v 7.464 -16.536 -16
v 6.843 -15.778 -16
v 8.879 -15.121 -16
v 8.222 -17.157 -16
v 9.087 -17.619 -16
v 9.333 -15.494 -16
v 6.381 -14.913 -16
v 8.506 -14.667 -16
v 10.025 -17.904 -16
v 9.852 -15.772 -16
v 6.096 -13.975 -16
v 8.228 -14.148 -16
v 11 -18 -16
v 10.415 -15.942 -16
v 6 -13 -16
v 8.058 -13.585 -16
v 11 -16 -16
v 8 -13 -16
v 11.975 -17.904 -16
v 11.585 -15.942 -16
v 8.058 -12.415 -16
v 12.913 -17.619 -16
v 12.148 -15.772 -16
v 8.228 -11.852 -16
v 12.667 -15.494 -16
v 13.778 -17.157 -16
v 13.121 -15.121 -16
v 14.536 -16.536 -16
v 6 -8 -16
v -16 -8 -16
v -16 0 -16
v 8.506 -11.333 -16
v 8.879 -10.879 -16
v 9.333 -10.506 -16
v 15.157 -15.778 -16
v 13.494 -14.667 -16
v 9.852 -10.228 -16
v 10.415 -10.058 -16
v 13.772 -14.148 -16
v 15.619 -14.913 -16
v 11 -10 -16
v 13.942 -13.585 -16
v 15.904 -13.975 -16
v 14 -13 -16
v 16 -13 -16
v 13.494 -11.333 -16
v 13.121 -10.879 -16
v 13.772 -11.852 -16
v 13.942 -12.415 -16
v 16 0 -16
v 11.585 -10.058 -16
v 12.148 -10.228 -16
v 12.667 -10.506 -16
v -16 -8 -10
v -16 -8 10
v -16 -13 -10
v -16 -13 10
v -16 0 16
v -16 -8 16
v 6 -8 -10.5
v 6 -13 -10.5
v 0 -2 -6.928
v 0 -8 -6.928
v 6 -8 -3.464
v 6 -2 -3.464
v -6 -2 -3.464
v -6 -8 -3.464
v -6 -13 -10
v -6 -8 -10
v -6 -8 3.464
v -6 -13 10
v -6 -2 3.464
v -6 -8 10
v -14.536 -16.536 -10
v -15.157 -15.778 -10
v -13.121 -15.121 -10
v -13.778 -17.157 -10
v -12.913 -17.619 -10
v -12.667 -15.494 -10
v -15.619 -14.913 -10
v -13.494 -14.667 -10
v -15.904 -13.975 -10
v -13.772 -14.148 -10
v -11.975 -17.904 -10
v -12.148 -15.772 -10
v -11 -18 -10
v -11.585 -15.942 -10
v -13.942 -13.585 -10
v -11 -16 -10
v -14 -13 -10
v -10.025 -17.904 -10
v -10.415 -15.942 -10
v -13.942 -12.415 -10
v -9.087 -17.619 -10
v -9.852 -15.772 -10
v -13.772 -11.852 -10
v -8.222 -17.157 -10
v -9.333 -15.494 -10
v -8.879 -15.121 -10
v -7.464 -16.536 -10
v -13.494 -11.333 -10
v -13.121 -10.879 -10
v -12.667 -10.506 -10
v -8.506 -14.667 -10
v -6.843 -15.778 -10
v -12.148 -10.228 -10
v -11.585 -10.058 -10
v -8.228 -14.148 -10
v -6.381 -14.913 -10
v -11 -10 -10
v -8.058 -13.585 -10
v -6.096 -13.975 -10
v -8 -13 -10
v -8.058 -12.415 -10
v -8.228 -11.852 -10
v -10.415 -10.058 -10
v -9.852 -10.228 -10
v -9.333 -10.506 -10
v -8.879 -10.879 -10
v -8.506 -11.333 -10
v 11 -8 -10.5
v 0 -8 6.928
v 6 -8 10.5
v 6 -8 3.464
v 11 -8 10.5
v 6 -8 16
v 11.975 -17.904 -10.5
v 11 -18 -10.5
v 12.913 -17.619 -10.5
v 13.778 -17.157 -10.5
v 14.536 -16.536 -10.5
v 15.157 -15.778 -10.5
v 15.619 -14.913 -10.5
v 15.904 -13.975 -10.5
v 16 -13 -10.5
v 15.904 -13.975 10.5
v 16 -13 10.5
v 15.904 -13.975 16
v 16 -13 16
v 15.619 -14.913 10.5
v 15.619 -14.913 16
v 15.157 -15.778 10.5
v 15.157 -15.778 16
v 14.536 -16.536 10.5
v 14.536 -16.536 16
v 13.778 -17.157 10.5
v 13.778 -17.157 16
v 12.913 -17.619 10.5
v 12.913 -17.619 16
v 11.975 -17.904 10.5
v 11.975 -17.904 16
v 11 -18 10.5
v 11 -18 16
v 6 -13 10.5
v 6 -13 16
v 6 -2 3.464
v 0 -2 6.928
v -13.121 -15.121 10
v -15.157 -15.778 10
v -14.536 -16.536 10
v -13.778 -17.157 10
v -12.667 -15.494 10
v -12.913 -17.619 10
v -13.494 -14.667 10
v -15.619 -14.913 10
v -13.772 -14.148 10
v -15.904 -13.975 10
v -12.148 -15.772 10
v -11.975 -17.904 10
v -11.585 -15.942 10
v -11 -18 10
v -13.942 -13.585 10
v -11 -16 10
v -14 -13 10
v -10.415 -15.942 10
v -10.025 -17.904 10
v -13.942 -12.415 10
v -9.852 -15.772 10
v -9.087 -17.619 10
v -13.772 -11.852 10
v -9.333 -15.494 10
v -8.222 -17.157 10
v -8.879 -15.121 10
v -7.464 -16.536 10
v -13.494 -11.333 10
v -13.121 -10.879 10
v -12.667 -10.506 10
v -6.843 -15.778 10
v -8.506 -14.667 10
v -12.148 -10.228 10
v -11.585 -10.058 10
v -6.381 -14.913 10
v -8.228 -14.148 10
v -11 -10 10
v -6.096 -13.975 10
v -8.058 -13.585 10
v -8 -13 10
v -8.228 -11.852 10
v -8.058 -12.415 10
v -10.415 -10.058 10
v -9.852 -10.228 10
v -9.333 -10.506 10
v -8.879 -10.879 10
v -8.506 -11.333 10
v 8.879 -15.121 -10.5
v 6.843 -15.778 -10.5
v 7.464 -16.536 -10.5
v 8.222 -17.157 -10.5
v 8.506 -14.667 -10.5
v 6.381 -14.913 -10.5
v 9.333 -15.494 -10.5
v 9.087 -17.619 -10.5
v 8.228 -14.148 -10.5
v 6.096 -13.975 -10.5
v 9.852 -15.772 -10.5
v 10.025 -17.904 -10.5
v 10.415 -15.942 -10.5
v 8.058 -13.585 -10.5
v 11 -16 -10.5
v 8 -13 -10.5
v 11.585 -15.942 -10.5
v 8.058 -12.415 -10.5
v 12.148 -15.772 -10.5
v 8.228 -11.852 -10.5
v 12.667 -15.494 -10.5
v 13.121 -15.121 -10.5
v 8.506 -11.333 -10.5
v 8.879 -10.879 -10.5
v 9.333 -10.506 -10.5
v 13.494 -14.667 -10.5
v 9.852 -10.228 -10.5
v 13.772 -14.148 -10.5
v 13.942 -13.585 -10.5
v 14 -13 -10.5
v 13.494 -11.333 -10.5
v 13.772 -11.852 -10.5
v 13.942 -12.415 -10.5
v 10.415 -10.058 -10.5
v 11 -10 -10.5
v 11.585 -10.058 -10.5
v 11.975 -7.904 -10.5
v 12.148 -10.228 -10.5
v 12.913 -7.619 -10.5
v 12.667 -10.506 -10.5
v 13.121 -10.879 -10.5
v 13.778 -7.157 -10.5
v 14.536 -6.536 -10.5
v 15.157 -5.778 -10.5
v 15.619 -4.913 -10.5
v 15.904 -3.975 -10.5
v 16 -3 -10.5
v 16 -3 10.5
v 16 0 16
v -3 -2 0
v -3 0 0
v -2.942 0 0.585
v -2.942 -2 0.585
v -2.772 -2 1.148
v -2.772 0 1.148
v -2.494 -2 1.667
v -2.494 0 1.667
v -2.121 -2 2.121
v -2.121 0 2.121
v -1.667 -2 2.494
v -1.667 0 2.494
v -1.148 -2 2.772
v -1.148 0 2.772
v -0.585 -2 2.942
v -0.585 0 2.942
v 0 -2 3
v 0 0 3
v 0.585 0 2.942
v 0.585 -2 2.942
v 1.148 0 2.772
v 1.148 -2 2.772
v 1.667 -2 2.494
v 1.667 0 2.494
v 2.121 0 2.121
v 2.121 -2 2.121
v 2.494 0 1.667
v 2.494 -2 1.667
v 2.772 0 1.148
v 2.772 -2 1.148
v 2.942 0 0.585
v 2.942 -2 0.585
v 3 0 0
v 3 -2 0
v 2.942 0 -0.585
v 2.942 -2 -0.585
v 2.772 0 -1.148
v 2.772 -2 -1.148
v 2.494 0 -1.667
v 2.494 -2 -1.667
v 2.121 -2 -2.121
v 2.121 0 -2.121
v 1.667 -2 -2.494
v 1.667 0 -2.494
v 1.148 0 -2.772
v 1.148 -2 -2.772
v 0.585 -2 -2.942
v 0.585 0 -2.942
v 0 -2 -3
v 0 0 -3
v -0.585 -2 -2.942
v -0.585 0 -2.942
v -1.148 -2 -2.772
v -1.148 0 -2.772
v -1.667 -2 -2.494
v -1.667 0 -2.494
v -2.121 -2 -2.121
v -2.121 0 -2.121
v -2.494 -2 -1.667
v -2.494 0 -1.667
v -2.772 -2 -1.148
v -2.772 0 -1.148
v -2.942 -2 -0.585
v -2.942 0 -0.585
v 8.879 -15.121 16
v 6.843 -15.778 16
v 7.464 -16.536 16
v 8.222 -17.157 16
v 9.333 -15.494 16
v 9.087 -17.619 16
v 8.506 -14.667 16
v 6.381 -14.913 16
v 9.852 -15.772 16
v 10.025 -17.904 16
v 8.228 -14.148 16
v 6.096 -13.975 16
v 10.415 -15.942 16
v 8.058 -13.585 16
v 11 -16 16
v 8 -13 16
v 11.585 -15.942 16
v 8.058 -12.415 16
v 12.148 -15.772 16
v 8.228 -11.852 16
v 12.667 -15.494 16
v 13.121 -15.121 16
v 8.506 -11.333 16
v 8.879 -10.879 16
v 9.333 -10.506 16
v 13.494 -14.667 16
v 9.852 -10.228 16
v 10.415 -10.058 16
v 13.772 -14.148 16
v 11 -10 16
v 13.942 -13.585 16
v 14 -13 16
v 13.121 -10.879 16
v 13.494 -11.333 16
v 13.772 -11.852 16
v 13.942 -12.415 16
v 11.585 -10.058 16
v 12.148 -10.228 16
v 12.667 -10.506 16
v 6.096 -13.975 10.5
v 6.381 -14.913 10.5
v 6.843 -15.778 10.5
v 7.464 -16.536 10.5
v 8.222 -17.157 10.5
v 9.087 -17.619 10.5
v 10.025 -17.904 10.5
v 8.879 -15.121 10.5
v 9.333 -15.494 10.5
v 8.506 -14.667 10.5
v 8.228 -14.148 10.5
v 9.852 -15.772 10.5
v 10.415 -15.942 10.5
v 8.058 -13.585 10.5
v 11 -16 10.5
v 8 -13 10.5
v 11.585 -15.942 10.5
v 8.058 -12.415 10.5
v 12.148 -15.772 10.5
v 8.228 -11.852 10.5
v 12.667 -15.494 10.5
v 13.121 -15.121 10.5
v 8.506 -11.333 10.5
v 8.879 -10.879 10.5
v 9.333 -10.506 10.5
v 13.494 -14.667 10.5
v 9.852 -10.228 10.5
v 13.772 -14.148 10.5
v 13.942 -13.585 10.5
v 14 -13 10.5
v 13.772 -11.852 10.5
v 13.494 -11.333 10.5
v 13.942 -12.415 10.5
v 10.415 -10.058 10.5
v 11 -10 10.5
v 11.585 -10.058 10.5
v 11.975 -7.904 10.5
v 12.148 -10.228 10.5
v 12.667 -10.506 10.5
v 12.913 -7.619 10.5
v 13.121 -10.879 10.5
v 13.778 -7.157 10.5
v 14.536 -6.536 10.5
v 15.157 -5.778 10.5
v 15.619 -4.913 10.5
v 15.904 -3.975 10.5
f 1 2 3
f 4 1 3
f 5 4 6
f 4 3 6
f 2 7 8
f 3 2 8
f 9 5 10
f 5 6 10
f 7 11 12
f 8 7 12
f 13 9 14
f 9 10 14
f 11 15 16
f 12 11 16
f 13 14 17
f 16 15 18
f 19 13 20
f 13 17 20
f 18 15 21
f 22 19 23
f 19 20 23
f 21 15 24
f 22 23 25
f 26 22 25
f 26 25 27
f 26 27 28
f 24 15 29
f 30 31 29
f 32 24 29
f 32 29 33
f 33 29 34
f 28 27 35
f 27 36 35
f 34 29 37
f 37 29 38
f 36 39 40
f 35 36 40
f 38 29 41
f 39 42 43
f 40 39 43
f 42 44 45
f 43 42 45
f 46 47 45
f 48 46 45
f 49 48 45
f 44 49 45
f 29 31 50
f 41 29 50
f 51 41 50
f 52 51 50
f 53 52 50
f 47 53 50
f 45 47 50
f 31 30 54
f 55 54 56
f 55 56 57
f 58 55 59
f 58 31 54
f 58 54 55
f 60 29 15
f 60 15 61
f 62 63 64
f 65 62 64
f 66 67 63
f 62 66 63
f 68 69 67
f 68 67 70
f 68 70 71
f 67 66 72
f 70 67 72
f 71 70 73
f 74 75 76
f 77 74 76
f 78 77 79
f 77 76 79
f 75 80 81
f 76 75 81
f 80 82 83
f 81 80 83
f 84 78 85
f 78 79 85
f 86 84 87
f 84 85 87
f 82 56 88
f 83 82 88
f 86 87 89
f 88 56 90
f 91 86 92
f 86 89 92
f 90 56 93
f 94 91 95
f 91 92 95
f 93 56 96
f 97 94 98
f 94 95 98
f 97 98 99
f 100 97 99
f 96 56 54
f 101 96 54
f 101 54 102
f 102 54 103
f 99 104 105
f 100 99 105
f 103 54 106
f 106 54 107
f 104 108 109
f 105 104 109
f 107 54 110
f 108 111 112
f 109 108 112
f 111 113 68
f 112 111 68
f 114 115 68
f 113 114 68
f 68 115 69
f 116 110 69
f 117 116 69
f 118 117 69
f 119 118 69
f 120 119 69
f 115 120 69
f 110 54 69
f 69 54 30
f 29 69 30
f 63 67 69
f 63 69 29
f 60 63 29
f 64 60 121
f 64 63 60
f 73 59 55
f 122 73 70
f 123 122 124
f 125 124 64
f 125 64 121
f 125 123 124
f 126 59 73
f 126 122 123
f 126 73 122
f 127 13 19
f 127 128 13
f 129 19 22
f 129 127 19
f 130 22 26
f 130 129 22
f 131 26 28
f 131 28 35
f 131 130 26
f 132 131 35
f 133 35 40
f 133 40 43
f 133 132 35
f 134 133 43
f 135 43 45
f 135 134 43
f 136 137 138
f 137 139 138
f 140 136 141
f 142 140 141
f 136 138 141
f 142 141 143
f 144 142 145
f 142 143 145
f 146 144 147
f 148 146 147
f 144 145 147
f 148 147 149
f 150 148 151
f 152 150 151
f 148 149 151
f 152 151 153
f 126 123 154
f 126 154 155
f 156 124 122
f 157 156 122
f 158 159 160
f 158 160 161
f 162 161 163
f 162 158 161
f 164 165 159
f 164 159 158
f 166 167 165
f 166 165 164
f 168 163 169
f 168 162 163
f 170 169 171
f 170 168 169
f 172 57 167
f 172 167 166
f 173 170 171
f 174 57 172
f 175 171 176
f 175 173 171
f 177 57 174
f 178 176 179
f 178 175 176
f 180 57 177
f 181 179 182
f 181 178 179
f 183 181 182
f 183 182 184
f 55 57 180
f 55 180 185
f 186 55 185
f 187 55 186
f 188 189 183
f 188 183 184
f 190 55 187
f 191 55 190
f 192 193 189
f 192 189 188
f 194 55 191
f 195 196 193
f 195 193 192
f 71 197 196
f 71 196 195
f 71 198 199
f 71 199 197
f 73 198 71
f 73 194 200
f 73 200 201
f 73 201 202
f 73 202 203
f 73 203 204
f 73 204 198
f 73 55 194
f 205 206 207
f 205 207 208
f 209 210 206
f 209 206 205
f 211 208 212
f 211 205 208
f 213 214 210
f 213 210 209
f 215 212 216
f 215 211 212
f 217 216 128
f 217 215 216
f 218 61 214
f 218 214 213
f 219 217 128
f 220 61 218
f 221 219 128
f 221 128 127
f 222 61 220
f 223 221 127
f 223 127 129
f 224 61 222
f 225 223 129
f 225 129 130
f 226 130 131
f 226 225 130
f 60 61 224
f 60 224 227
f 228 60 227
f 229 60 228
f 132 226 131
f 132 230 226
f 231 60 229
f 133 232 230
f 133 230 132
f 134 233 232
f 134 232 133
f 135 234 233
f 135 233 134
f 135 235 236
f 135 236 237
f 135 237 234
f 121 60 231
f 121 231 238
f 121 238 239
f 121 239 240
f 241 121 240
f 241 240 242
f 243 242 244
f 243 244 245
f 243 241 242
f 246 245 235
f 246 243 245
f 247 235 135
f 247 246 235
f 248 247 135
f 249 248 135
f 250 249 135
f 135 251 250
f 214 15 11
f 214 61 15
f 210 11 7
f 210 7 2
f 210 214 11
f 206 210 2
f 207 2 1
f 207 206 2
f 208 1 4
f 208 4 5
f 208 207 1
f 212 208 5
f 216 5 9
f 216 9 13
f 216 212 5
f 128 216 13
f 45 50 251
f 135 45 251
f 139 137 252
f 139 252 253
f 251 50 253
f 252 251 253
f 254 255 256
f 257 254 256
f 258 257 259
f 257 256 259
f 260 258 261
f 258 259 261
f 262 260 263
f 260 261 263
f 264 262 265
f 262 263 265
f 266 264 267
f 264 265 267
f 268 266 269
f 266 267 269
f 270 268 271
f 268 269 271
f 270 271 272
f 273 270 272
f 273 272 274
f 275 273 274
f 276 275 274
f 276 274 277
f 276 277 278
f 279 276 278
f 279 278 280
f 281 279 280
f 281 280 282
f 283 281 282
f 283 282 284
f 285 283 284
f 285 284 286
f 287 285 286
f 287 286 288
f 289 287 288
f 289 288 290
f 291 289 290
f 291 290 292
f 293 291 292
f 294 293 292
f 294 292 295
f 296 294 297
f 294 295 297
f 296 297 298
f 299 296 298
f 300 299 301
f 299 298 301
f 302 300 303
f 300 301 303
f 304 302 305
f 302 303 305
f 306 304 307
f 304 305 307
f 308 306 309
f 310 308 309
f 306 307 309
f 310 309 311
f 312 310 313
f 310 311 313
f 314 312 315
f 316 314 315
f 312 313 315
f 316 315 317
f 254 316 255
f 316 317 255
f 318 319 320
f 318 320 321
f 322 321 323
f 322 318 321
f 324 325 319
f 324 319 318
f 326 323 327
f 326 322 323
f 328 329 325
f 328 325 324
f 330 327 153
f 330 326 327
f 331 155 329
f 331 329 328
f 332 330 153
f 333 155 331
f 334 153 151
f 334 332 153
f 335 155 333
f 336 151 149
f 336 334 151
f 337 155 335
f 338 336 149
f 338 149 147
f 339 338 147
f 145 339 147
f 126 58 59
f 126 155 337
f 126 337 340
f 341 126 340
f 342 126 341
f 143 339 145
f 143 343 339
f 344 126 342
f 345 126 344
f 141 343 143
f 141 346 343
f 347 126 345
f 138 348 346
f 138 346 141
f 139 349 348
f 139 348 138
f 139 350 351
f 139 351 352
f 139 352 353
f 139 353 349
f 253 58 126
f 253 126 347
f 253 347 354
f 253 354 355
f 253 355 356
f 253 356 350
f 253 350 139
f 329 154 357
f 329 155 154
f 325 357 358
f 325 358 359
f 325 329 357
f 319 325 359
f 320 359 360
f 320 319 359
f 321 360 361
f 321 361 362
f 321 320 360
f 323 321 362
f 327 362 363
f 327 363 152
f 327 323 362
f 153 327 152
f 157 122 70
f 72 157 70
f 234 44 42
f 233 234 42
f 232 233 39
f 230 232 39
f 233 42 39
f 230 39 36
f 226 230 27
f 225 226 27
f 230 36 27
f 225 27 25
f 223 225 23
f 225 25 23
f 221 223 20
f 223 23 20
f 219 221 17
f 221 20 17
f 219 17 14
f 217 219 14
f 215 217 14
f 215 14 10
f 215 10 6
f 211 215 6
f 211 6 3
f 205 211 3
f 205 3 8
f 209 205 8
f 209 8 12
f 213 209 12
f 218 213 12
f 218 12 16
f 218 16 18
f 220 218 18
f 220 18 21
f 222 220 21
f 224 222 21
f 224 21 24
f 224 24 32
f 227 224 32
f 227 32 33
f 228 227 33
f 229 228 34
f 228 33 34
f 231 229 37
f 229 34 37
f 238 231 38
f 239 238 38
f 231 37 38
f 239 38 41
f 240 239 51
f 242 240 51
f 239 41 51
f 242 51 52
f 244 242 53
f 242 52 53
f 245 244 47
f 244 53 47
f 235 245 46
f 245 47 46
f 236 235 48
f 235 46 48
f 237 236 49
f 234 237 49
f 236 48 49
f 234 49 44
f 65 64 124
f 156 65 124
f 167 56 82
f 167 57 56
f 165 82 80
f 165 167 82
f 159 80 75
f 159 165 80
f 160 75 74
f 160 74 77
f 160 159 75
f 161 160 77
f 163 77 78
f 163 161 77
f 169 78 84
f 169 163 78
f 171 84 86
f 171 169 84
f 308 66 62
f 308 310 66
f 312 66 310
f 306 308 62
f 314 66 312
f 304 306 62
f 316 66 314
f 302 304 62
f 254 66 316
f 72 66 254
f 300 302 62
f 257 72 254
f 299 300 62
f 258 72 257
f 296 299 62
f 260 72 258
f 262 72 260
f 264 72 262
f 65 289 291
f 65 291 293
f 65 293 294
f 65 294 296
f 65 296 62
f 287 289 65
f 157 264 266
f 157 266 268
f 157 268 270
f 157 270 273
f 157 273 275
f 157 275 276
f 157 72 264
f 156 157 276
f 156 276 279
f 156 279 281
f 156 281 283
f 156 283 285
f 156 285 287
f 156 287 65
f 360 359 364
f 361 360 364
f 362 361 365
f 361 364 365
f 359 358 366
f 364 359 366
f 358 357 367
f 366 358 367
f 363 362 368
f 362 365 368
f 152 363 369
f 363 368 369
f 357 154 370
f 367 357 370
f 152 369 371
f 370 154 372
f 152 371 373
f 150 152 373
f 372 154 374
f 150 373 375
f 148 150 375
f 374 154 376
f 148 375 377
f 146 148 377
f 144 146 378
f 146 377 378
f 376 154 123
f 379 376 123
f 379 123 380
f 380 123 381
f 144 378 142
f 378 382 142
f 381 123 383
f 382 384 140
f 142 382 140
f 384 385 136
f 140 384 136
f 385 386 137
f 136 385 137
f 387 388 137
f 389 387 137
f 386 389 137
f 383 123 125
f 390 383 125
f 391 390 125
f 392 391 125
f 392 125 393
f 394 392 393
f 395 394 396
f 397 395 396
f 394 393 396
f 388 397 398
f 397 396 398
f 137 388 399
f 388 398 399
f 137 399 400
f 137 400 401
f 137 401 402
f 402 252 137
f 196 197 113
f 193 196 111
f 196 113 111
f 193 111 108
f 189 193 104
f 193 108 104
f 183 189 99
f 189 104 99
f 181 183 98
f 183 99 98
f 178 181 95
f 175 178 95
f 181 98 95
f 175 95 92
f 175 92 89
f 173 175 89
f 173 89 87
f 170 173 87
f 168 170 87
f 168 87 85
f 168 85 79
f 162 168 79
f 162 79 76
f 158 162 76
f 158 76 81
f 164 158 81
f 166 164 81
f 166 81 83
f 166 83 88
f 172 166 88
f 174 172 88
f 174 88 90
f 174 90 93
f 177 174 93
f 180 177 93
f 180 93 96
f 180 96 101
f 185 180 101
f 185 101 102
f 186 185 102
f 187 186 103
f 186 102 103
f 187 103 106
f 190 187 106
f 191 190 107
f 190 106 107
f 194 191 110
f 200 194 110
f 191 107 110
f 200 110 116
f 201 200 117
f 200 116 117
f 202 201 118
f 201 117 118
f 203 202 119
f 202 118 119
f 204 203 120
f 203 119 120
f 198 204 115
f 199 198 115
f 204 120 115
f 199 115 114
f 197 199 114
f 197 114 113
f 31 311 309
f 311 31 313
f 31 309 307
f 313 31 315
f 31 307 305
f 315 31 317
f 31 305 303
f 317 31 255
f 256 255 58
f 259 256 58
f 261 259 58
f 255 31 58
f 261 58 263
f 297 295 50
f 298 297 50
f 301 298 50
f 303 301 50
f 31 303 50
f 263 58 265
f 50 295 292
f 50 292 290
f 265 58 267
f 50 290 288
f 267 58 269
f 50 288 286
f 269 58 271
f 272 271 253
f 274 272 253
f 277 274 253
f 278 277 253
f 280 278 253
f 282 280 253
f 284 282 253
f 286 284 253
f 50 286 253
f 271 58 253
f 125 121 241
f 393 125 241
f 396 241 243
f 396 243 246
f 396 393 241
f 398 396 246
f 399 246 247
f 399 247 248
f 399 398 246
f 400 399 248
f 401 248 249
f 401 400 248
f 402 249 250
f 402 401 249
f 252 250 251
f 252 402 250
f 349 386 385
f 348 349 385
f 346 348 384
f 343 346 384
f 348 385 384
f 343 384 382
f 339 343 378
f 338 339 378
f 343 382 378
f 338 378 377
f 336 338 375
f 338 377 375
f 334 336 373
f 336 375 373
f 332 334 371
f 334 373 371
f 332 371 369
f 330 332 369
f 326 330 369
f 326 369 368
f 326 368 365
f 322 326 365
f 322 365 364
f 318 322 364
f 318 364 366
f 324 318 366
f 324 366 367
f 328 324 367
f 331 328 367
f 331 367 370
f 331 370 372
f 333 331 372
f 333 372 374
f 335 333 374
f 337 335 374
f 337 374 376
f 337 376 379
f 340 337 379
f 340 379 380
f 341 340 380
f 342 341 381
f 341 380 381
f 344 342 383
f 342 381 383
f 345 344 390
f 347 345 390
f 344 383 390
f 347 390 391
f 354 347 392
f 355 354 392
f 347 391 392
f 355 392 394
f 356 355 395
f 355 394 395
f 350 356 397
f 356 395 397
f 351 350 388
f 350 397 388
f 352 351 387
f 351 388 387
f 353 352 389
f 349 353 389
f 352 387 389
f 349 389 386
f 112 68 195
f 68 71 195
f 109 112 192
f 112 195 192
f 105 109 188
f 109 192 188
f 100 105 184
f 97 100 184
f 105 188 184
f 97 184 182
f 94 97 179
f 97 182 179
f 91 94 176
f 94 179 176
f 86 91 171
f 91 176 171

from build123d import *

# Parameters (mm, degrees)
F0_W      = 32
F0_H      = 32
F1_DEPTH  = 8
F2_W      = 10
F2_H      = 20
F2_H_2    = 5.5
F3_DEPTH  = 10
F5_DEPTH  = 6
F6_R      = 3
F7_DEPTH  = 25
F8_R      = 3
F9_DEPTH  = 25
F10_R     = 3
F11_DEPTH = 32.001
F12_R     = 4.99999
F13_R     = 4.99999
F14_R     = 5


# Not quite as in the source:
# - a fillet or chamfer is up to 0.001 mm smaller than in the source, because OpenCascade refuses the exact size


with BuildPart() as f1:
    # F0 (on Front) → F1 (new body)
    with BuildSketch(Plane.XZ):
        Rectangle(F0_W, F0_H)
    extrude(amount=F1_DEPTH)

    # F2 (on face) → F3 (join)
    with BuildSketch(Plane.XZ.offset(8)):
        with Locations((-11, 0)):
            Rectangle(F2_W, F2_H)
        with Locations((11, -13.25)):
            Rectangle(F2_W, F2_H_2)
        with Locations((11, 13.25)):
            Rectangle(F2_W, F2_H_2)
    extrude(amount=F3_DEPTH)

    # F4 (on face) → F5 (cut)
    with BuildSketch(Plane.XZ.offset(8)):
        Polygon((6, -3.4641016151), (6, 3.4641016151), (0, 6.9282032303), (-6, 3.4641016151), (-6, -3.4641016151), (0, -6.9282032303), align=None)
    extrude(amount=-F5_DEPTH, mode=Mode.SUBTRACT)

    # F6 (on face) → F7 (cut)
    with BuildSketch(Plane(origin=(0, 0, 0), x_dir=(-1, 0, 0), z_dir=(0, 1, 0))):
        Circle(F6_R)
    extrude(amount=-F7_DEPTH, mode=Mode.SUBTRACT)

    # F8 (on face) → F9 (cut)
    with BuildSketch(Plane(origin=(0, 0, -10), x_dir=(1, 0, 0), z_dir=(0, 0, -1))):
        with Locations((-11, 13)):
            Circle(F8_R)
    extrude(amount=-F9_DEPTH, mode=Mode.SUBTRACT)

    # F10 (on face) → F11 (cut, through all)
    with BuildSketch(Plane(origin=(0, 0, -16), x_dir=(1, 0, 0), z_dir=(0, 0, -1))):
        with Locations((11, 13)):
            Circle(F10_R)
    extrude(amount=-F11_DEPTH, mode=Mode.SUBTRACT)

    # F12 (radius 5 in the source; OpenCascade refuses exactly that, so slightly less here)
    f12_edges = [f1.edges().sort_by_distance(p)[0] for p in [
        (6, -18, 13.25),
        (16, -18, 13.25),
        (16, -18, -13.25),
        (6, -18, -13.25),
    ]]
    fillet(f12_edges, radius=F12_R)

    # F13 (radius 5 in the source; OpenCascade refuses exactly that, so slightly less here)
    f13_edges = [f1.edges().sort_by_distance(p)[0] for p in [
        (-6, -18, 0),
        (-16, -18, 0),
    ]]
    fillet(f13_edges, radius=F13_R)

    # F14
    f14_edges = [f1.edges().sort_by_distance(p)[0] for p in [
        (16, -8, 0),
    ]]
    fillet(f14_edges, radius=F14_R)


solid = f1.part
